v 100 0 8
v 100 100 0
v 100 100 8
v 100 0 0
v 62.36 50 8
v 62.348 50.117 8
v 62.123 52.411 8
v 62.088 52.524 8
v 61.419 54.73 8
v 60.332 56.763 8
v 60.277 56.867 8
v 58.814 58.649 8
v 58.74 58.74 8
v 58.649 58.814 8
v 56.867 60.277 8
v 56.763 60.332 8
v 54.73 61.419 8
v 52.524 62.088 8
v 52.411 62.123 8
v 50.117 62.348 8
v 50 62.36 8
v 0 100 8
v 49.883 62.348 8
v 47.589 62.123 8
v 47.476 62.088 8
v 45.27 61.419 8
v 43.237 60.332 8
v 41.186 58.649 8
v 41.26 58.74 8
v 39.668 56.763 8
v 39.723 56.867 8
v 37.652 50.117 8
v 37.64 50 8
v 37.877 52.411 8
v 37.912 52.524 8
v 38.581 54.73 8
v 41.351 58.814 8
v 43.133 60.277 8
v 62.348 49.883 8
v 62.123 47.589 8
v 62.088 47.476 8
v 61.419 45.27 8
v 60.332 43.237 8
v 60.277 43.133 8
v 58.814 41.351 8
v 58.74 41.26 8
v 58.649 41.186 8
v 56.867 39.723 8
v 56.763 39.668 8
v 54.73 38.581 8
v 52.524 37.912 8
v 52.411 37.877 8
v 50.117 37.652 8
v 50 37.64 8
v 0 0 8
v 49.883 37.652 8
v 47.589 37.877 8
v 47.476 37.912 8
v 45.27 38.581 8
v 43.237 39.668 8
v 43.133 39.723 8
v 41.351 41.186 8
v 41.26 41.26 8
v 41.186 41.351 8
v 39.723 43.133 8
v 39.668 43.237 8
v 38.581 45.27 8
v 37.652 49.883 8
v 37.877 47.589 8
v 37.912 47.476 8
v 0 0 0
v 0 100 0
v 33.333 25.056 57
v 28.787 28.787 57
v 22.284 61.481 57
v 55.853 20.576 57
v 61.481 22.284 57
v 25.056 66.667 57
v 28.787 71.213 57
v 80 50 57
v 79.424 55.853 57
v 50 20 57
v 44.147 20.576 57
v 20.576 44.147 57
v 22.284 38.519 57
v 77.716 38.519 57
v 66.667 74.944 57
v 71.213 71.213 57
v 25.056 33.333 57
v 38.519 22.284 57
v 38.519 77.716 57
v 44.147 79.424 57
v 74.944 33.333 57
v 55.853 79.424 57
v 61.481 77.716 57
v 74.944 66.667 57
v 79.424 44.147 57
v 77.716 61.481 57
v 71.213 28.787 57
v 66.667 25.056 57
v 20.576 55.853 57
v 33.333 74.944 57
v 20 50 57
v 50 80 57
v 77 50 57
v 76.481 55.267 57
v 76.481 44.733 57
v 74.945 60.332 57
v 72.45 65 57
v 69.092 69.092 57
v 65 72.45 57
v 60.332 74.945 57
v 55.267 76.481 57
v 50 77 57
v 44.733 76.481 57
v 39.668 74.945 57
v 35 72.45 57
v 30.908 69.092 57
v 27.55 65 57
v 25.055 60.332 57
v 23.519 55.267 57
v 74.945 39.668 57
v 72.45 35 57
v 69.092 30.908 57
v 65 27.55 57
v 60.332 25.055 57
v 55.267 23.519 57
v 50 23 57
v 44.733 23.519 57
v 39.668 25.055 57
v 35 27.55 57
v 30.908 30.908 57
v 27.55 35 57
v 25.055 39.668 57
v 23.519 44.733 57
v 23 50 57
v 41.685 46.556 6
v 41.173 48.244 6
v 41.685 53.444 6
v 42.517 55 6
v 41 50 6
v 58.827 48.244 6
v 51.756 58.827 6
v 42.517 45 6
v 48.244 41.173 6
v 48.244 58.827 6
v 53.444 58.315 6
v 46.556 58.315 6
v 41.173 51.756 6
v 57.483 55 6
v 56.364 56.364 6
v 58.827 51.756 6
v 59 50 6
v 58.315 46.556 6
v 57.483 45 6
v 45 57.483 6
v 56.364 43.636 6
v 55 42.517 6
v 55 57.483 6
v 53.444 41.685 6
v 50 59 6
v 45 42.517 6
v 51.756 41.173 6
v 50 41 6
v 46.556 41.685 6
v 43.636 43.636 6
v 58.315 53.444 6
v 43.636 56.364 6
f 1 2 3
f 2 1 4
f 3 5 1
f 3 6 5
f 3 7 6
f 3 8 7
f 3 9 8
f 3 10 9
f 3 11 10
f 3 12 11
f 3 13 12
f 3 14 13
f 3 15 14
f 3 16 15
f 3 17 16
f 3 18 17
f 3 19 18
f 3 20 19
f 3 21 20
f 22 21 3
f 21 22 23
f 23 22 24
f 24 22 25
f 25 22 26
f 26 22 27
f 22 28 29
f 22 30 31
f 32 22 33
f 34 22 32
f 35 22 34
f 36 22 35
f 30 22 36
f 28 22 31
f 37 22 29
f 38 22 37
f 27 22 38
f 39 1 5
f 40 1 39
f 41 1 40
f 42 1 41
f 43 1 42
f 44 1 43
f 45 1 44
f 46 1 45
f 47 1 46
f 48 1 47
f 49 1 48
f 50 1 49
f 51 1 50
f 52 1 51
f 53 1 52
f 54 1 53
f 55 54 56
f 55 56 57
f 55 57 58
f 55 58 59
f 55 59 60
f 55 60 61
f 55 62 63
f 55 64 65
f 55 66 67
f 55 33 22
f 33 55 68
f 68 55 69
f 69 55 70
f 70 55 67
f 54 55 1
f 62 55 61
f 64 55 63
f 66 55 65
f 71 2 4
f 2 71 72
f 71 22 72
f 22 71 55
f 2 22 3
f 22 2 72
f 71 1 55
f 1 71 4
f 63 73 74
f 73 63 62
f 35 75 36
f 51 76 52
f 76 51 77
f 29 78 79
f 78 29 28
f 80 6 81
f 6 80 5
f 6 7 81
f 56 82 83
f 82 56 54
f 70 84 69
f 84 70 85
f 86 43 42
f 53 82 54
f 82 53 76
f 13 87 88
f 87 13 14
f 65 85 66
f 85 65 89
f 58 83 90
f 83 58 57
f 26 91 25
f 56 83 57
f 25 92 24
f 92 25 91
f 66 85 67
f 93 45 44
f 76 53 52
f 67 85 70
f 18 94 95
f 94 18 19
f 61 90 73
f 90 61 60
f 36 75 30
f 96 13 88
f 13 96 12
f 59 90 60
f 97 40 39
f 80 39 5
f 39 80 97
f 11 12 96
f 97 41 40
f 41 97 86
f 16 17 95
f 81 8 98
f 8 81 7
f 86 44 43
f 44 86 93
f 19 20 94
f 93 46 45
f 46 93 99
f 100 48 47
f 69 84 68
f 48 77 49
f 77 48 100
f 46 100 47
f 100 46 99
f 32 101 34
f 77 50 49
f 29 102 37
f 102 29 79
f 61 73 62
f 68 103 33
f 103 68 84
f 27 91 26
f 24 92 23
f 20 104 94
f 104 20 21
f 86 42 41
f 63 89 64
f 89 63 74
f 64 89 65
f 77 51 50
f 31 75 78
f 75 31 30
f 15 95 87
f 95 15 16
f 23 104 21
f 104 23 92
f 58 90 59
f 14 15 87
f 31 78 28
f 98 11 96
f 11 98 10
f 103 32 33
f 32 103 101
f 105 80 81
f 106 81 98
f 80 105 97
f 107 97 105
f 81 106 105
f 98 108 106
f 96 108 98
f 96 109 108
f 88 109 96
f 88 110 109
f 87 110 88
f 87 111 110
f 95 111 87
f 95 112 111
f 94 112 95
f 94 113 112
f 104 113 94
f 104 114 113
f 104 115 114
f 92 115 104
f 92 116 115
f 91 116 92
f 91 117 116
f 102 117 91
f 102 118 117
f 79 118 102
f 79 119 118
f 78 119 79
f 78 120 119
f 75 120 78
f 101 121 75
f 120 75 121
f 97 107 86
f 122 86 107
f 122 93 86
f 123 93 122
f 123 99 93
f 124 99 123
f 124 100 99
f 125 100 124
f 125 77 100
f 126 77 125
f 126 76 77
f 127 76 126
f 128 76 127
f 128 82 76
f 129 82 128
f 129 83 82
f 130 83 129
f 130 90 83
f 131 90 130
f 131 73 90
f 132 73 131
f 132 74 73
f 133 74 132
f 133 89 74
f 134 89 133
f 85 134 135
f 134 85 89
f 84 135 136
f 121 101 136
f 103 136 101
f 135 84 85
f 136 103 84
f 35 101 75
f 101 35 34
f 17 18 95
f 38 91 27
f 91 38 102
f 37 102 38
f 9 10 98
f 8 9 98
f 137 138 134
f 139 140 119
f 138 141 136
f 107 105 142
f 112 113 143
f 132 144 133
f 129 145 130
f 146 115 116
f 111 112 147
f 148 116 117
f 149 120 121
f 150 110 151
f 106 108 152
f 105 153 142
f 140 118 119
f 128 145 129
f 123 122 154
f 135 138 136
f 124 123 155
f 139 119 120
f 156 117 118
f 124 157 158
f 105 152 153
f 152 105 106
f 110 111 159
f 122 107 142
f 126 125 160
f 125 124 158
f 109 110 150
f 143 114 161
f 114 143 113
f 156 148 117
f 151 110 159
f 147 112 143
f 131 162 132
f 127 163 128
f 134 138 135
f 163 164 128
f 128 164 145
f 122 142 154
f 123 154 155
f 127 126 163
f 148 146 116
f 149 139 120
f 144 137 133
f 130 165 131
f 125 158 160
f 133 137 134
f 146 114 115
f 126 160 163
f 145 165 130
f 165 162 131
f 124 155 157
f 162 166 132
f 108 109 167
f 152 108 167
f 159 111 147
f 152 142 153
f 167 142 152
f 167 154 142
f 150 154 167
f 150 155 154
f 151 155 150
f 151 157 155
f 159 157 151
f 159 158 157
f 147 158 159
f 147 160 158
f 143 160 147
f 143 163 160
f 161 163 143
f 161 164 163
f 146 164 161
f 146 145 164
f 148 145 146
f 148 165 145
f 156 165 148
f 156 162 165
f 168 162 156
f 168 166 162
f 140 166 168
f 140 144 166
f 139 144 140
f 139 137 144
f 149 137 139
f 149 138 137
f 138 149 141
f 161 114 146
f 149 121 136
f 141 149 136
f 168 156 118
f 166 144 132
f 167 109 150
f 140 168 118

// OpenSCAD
$fn = 32;

// ----------------------------------------------------------------------
// Hopper: funnel with square flange
// ----------------------------------------------------------------------

// --- parameters (mm) ---
fl = 100;                 // flange side, X and Y
fl_t = 8;                 // flange thickness
cone_h = 50;              // cone height above the flange
top_d = 60;               // cone mouth diameter
bot_d = 24;               // cone spout diameter
wall = 3;                 // cone wall thickness

bore_d = bot_d - 2 * wall;  // spout bore diameter
total_h = fl_t + cone_h - 1;  // overall height

difference() {
  union() {
    cube([fl, fl, fl_t]);
    translate([fl / 2, fl / 2, fl_t - 1])
      cylinder(h = cone_h, d1 = bot_d, d2 = top_d);
  }
  translate([fl / 2, fl / 2, fl_t - 2])
    cylinder(h = cone_h + 1, d1 = bore_d, d2 = top_d - 2 * wall);
}
